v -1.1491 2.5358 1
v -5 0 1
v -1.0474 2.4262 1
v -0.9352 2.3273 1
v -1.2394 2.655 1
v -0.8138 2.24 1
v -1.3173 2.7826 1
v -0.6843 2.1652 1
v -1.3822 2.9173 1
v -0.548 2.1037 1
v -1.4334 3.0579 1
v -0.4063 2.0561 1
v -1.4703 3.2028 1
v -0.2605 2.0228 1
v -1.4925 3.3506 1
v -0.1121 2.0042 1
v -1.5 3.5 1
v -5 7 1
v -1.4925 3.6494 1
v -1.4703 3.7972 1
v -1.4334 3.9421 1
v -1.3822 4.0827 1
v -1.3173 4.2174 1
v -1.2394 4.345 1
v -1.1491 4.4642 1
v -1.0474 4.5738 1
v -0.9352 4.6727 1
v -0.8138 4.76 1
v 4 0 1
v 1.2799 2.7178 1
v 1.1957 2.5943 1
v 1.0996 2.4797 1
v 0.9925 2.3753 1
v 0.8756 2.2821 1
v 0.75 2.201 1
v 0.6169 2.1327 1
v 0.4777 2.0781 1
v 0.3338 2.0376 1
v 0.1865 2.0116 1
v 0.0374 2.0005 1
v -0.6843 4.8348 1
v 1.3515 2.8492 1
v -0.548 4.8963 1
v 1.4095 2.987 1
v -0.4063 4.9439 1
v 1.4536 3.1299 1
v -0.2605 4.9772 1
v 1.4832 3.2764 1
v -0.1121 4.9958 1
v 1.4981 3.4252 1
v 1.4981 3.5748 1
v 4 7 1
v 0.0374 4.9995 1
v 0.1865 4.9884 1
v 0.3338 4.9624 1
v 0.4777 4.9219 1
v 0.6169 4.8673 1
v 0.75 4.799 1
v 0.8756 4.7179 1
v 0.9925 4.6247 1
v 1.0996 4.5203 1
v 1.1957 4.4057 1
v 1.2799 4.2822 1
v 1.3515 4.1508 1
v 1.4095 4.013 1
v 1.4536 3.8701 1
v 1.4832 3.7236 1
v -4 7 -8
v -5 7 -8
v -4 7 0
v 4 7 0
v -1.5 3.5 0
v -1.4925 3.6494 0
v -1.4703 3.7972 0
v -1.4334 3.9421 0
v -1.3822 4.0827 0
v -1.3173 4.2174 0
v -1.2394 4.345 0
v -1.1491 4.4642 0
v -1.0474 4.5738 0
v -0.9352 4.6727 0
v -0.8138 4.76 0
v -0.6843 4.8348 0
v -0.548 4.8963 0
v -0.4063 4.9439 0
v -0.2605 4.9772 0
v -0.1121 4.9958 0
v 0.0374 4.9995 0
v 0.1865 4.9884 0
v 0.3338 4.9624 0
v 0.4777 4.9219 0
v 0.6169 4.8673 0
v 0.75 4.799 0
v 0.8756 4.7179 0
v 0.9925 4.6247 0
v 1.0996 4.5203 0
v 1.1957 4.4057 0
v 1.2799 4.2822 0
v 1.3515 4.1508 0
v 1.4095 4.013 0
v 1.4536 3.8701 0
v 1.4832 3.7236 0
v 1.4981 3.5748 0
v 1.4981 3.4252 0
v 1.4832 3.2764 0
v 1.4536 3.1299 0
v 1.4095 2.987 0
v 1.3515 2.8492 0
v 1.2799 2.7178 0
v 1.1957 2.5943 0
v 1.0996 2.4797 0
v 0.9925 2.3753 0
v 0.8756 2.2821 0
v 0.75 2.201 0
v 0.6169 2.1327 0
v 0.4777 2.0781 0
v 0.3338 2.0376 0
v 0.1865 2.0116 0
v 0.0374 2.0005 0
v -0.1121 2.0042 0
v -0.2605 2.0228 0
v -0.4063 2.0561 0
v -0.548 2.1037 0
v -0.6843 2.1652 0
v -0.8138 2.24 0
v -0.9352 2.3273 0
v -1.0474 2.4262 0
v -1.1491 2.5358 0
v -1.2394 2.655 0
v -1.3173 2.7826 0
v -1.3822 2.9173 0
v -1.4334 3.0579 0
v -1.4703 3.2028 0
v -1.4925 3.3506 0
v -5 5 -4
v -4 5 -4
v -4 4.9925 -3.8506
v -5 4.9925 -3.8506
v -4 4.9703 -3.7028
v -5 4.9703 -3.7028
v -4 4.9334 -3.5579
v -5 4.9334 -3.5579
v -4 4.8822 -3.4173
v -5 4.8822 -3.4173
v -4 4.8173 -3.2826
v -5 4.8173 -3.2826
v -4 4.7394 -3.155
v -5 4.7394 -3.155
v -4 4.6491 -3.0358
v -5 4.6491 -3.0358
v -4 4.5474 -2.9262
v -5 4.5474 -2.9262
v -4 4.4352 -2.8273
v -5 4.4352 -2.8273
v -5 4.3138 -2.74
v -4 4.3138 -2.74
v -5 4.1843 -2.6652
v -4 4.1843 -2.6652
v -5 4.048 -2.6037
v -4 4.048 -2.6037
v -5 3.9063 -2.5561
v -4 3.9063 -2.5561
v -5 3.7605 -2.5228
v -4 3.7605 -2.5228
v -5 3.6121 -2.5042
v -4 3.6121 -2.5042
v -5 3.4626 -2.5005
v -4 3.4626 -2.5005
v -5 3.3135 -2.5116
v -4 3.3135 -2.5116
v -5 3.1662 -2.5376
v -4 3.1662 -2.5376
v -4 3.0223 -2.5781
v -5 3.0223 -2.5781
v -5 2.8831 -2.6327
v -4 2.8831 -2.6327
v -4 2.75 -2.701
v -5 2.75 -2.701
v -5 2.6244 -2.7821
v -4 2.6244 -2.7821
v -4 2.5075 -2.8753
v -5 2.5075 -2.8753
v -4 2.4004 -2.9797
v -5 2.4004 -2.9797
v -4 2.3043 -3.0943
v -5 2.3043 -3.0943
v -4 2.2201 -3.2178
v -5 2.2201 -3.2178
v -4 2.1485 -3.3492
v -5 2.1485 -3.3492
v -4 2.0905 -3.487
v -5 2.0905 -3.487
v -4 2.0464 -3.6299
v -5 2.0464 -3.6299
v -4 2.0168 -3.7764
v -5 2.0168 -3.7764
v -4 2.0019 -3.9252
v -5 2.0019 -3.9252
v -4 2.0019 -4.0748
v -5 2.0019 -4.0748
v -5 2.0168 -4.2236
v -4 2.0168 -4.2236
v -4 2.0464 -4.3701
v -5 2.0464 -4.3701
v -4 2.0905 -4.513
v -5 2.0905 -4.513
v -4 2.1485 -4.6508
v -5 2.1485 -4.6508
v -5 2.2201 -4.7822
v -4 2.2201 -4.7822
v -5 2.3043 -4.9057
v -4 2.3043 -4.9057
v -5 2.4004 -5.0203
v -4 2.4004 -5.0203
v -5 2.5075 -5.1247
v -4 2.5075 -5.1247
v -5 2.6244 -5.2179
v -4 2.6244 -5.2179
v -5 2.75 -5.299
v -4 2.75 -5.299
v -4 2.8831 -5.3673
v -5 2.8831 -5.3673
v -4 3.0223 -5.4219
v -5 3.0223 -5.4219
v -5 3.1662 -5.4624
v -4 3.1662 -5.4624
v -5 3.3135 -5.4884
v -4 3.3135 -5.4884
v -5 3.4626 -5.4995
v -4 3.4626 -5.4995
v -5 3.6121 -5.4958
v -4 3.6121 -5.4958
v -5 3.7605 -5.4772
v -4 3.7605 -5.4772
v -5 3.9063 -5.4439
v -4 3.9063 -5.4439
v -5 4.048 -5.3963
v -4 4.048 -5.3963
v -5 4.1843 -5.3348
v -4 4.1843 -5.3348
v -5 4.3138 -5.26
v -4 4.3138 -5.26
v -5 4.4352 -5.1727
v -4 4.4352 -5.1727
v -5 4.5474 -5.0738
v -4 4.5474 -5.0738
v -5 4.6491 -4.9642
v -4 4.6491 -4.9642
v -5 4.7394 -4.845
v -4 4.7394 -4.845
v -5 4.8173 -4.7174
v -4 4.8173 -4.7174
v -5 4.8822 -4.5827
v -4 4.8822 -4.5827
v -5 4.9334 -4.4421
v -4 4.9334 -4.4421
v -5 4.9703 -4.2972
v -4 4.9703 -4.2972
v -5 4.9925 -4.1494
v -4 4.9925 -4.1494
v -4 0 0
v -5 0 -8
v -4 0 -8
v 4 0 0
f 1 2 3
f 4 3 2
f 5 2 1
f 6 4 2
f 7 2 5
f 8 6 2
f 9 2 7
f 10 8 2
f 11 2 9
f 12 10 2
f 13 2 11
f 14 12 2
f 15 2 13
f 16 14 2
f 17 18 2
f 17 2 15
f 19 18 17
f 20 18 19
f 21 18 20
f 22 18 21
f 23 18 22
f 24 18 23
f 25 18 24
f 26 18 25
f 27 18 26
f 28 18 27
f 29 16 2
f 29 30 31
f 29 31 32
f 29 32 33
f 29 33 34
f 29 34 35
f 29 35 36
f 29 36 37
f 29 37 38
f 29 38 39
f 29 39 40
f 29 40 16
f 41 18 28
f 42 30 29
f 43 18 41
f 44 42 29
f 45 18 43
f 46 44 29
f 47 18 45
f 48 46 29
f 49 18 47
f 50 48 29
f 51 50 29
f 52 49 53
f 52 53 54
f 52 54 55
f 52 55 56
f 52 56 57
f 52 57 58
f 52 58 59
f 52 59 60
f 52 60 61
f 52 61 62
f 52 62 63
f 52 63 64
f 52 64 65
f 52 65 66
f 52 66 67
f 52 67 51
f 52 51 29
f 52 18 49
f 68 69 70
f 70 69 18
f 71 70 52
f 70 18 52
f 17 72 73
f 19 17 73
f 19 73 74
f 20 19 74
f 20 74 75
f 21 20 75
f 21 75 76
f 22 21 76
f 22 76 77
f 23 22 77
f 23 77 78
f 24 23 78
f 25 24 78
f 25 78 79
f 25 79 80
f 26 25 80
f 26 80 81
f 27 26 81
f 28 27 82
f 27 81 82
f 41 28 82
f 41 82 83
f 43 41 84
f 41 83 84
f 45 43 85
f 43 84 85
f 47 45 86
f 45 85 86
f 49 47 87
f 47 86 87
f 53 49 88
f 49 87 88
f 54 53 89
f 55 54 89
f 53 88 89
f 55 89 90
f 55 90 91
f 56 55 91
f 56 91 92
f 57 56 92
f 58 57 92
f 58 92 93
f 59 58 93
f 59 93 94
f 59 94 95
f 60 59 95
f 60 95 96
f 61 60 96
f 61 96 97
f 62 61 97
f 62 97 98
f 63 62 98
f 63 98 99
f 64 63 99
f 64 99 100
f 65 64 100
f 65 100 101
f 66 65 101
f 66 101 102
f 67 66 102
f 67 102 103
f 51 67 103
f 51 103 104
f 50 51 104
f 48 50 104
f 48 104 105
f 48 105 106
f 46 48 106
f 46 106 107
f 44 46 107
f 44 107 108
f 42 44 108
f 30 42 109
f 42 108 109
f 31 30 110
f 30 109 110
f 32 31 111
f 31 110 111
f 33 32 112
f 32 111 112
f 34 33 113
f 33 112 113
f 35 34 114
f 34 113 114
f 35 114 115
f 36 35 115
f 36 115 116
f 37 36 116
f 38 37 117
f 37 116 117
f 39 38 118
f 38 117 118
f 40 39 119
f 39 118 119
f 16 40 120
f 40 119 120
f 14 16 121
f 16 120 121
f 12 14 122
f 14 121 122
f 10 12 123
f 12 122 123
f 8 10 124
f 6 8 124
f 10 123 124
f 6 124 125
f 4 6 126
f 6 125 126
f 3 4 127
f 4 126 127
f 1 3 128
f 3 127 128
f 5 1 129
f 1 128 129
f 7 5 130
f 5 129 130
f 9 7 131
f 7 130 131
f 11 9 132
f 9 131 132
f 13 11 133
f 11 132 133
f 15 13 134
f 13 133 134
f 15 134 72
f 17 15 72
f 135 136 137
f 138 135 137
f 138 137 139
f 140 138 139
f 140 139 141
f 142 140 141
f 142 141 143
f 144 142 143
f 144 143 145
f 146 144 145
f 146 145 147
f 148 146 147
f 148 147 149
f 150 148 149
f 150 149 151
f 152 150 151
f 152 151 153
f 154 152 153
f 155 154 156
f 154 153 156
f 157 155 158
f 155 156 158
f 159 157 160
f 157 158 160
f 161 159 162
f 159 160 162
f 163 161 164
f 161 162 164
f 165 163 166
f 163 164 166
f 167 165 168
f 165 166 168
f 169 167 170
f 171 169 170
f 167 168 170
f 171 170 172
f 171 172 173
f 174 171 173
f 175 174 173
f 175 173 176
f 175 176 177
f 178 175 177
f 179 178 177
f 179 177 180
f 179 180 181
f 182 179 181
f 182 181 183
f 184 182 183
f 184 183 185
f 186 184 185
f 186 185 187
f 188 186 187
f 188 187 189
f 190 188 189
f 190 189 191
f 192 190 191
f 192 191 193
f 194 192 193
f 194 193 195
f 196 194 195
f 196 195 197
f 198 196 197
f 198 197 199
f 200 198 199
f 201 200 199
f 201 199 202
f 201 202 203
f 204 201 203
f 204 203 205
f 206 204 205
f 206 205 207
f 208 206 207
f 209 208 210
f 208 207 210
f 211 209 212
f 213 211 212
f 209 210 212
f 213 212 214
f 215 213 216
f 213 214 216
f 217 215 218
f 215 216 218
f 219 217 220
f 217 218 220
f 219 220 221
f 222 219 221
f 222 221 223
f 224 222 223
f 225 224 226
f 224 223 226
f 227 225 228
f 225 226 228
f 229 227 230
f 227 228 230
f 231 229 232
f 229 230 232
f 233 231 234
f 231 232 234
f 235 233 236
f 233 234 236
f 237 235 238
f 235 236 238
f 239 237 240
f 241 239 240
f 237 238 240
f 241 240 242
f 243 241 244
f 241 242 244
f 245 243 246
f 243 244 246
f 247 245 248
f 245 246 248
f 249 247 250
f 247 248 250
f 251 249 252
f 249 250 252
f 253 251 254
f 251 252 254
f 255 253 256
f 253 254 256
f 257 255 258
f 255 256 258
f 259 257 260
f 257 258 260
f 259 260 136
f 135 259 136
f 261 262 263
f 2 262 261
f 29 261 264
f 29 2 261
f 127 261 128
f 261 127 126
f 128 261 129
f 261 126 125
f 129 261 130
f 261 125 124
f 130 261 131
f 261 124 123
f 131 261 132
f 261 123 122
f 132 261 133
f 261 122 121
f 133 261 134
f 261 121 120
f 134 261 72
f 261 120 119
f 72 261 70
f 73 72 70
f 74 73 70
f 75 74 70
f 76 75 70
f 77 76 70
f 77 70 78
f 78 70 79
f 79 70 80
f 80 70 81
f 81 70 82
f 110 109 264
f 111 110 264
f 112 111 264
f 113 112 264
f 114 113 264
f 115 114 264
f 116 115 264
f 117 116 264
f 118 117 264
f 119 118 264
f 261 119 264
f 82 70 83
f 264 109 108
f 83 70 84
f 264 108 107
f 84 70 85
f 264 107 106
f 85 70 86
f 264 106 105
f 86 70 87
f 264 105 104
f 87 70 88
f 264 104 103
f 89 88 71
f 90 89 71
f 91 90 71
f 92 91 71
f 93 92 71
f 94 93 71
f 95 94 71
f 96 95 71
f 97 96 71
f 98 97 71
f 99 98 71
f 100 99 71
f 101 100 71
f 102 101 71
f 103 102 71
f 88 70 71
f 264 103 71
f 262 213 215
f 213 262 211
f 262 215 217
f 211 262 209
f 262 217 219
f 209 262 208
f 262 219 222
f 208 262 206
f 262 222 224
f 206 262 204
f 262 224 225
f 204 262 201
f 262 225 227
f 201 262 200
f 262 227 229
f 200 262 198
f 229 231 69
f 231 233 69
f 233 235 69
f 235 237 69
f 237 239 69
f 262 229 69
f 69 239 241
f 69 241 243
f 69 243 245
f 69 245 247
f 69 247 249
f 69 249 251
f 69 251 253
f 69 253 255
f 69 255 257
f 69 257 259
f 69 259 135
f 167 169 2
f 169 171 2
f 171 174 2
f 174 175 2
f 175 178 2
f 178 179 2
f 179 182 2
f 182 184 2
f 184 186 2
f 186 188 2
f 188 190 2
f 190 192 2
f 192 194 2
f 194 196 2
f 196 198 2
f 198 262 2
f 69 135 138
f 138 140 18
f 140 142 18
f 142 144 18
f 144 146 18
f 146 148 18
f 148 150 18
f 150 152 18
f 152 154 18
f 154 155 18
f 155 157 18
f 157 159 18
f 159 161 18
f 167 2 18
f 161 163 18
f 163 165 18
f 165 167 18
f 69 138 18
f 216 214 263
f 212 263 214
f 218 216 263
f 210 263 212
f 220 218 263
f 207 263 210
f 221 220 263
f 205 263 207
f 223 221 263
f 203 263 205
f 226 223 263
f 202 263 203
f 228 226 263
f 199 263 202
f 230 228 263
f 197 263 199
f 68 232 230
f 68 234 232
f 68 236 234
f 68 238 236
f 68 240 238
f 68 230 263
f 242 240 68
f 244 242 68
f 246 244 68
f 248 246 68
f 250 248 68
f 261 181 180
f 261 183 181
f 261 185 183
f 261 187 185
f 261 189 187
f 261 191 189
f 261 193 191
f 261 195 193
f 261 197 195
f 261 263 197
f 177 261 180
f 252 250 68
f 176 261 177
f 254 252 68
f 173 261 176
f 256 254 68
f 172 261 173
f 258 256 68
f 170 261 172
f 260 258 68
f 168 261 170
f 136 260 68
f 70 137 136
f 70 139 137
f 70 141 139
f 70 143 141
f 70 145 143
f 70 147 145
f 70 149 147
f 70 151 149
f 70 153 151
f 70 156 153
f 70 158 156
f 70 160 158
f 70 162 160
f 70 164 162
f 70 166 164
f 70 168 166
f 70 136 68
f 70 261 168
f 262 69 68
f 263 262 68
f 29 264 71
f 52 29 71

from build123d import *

# Parameters (mm, degrees)
ESQUISSE1_W             = 8
ESQUISSE1_H             = 7
BOSS_EXTRU_1_DEPTH      = 1
ESQUISSE2_W             = 1
ESQUISSE2_H             = 7
BOSS_EXTRU_2_DEPTH      = 9
ESQUISSE3_R             = 1.5
ENL_V_MAT_EXTRU_1_DEPTH = 14.304134696
ESQUISSE4_R             = 1.5
ENL_V_MAT_EXTRU_2_DEPTH = 12.747340124


with BuildPart() as part:
    # Esquisse1 → Boss.-Extru.1 (new body)
    with BuildSketch(Plane.XY):
        with Locations((0, 3.5)):
            Rectangle(ESQUISSE1_W, ESQUISSE1_H)
    extrude(amount=BOSS_EXTRU_1_DEPTH)

    # Esquisse2 → Boss.-Extru.2 (add)
    with BuildSketch(Plane.XY.offset(1)):
        with Locations((-4.5, 3.5)):
            Rectangle(ESQUISSE2_W, ESQUISSE2_H)
    extrude(amount=-BOSS_EXTRU_2_DEPTH)

    # Esquisse3 → Enlèv. mat.-Extru.1 (cut, through all)
    with BuildSketch(Plane(origin=(-4, 0, 0), x_dir=(0, 0, -1), z_dir=(1, 0, 0))):
        with Locations(Location((4, 3.5, 0), (0, 0, 90))):
            Circle(ESQUISSE3_R)
    extrude(amount=-ENL_V_MAT_EXTRU_1_DEPTH, mode=Mode.SUBTRACT)

    # Esquisse4 → Enlèv. mat.-Extru.2 (cut, through all)
    with BuildSketch(Plane(origin=(0, 0, 0), x_dir=(-1, 0, 0), z_dir=(0, 0, -1))):
        with Locations((0, 3.5)):
            Circle(ESQUISSE4_R)
    extrude(amount=-ENL_V_MAT_EXTRU_2_DEPTH, mode=Mode.SUBTRACT)


solid = part.part
